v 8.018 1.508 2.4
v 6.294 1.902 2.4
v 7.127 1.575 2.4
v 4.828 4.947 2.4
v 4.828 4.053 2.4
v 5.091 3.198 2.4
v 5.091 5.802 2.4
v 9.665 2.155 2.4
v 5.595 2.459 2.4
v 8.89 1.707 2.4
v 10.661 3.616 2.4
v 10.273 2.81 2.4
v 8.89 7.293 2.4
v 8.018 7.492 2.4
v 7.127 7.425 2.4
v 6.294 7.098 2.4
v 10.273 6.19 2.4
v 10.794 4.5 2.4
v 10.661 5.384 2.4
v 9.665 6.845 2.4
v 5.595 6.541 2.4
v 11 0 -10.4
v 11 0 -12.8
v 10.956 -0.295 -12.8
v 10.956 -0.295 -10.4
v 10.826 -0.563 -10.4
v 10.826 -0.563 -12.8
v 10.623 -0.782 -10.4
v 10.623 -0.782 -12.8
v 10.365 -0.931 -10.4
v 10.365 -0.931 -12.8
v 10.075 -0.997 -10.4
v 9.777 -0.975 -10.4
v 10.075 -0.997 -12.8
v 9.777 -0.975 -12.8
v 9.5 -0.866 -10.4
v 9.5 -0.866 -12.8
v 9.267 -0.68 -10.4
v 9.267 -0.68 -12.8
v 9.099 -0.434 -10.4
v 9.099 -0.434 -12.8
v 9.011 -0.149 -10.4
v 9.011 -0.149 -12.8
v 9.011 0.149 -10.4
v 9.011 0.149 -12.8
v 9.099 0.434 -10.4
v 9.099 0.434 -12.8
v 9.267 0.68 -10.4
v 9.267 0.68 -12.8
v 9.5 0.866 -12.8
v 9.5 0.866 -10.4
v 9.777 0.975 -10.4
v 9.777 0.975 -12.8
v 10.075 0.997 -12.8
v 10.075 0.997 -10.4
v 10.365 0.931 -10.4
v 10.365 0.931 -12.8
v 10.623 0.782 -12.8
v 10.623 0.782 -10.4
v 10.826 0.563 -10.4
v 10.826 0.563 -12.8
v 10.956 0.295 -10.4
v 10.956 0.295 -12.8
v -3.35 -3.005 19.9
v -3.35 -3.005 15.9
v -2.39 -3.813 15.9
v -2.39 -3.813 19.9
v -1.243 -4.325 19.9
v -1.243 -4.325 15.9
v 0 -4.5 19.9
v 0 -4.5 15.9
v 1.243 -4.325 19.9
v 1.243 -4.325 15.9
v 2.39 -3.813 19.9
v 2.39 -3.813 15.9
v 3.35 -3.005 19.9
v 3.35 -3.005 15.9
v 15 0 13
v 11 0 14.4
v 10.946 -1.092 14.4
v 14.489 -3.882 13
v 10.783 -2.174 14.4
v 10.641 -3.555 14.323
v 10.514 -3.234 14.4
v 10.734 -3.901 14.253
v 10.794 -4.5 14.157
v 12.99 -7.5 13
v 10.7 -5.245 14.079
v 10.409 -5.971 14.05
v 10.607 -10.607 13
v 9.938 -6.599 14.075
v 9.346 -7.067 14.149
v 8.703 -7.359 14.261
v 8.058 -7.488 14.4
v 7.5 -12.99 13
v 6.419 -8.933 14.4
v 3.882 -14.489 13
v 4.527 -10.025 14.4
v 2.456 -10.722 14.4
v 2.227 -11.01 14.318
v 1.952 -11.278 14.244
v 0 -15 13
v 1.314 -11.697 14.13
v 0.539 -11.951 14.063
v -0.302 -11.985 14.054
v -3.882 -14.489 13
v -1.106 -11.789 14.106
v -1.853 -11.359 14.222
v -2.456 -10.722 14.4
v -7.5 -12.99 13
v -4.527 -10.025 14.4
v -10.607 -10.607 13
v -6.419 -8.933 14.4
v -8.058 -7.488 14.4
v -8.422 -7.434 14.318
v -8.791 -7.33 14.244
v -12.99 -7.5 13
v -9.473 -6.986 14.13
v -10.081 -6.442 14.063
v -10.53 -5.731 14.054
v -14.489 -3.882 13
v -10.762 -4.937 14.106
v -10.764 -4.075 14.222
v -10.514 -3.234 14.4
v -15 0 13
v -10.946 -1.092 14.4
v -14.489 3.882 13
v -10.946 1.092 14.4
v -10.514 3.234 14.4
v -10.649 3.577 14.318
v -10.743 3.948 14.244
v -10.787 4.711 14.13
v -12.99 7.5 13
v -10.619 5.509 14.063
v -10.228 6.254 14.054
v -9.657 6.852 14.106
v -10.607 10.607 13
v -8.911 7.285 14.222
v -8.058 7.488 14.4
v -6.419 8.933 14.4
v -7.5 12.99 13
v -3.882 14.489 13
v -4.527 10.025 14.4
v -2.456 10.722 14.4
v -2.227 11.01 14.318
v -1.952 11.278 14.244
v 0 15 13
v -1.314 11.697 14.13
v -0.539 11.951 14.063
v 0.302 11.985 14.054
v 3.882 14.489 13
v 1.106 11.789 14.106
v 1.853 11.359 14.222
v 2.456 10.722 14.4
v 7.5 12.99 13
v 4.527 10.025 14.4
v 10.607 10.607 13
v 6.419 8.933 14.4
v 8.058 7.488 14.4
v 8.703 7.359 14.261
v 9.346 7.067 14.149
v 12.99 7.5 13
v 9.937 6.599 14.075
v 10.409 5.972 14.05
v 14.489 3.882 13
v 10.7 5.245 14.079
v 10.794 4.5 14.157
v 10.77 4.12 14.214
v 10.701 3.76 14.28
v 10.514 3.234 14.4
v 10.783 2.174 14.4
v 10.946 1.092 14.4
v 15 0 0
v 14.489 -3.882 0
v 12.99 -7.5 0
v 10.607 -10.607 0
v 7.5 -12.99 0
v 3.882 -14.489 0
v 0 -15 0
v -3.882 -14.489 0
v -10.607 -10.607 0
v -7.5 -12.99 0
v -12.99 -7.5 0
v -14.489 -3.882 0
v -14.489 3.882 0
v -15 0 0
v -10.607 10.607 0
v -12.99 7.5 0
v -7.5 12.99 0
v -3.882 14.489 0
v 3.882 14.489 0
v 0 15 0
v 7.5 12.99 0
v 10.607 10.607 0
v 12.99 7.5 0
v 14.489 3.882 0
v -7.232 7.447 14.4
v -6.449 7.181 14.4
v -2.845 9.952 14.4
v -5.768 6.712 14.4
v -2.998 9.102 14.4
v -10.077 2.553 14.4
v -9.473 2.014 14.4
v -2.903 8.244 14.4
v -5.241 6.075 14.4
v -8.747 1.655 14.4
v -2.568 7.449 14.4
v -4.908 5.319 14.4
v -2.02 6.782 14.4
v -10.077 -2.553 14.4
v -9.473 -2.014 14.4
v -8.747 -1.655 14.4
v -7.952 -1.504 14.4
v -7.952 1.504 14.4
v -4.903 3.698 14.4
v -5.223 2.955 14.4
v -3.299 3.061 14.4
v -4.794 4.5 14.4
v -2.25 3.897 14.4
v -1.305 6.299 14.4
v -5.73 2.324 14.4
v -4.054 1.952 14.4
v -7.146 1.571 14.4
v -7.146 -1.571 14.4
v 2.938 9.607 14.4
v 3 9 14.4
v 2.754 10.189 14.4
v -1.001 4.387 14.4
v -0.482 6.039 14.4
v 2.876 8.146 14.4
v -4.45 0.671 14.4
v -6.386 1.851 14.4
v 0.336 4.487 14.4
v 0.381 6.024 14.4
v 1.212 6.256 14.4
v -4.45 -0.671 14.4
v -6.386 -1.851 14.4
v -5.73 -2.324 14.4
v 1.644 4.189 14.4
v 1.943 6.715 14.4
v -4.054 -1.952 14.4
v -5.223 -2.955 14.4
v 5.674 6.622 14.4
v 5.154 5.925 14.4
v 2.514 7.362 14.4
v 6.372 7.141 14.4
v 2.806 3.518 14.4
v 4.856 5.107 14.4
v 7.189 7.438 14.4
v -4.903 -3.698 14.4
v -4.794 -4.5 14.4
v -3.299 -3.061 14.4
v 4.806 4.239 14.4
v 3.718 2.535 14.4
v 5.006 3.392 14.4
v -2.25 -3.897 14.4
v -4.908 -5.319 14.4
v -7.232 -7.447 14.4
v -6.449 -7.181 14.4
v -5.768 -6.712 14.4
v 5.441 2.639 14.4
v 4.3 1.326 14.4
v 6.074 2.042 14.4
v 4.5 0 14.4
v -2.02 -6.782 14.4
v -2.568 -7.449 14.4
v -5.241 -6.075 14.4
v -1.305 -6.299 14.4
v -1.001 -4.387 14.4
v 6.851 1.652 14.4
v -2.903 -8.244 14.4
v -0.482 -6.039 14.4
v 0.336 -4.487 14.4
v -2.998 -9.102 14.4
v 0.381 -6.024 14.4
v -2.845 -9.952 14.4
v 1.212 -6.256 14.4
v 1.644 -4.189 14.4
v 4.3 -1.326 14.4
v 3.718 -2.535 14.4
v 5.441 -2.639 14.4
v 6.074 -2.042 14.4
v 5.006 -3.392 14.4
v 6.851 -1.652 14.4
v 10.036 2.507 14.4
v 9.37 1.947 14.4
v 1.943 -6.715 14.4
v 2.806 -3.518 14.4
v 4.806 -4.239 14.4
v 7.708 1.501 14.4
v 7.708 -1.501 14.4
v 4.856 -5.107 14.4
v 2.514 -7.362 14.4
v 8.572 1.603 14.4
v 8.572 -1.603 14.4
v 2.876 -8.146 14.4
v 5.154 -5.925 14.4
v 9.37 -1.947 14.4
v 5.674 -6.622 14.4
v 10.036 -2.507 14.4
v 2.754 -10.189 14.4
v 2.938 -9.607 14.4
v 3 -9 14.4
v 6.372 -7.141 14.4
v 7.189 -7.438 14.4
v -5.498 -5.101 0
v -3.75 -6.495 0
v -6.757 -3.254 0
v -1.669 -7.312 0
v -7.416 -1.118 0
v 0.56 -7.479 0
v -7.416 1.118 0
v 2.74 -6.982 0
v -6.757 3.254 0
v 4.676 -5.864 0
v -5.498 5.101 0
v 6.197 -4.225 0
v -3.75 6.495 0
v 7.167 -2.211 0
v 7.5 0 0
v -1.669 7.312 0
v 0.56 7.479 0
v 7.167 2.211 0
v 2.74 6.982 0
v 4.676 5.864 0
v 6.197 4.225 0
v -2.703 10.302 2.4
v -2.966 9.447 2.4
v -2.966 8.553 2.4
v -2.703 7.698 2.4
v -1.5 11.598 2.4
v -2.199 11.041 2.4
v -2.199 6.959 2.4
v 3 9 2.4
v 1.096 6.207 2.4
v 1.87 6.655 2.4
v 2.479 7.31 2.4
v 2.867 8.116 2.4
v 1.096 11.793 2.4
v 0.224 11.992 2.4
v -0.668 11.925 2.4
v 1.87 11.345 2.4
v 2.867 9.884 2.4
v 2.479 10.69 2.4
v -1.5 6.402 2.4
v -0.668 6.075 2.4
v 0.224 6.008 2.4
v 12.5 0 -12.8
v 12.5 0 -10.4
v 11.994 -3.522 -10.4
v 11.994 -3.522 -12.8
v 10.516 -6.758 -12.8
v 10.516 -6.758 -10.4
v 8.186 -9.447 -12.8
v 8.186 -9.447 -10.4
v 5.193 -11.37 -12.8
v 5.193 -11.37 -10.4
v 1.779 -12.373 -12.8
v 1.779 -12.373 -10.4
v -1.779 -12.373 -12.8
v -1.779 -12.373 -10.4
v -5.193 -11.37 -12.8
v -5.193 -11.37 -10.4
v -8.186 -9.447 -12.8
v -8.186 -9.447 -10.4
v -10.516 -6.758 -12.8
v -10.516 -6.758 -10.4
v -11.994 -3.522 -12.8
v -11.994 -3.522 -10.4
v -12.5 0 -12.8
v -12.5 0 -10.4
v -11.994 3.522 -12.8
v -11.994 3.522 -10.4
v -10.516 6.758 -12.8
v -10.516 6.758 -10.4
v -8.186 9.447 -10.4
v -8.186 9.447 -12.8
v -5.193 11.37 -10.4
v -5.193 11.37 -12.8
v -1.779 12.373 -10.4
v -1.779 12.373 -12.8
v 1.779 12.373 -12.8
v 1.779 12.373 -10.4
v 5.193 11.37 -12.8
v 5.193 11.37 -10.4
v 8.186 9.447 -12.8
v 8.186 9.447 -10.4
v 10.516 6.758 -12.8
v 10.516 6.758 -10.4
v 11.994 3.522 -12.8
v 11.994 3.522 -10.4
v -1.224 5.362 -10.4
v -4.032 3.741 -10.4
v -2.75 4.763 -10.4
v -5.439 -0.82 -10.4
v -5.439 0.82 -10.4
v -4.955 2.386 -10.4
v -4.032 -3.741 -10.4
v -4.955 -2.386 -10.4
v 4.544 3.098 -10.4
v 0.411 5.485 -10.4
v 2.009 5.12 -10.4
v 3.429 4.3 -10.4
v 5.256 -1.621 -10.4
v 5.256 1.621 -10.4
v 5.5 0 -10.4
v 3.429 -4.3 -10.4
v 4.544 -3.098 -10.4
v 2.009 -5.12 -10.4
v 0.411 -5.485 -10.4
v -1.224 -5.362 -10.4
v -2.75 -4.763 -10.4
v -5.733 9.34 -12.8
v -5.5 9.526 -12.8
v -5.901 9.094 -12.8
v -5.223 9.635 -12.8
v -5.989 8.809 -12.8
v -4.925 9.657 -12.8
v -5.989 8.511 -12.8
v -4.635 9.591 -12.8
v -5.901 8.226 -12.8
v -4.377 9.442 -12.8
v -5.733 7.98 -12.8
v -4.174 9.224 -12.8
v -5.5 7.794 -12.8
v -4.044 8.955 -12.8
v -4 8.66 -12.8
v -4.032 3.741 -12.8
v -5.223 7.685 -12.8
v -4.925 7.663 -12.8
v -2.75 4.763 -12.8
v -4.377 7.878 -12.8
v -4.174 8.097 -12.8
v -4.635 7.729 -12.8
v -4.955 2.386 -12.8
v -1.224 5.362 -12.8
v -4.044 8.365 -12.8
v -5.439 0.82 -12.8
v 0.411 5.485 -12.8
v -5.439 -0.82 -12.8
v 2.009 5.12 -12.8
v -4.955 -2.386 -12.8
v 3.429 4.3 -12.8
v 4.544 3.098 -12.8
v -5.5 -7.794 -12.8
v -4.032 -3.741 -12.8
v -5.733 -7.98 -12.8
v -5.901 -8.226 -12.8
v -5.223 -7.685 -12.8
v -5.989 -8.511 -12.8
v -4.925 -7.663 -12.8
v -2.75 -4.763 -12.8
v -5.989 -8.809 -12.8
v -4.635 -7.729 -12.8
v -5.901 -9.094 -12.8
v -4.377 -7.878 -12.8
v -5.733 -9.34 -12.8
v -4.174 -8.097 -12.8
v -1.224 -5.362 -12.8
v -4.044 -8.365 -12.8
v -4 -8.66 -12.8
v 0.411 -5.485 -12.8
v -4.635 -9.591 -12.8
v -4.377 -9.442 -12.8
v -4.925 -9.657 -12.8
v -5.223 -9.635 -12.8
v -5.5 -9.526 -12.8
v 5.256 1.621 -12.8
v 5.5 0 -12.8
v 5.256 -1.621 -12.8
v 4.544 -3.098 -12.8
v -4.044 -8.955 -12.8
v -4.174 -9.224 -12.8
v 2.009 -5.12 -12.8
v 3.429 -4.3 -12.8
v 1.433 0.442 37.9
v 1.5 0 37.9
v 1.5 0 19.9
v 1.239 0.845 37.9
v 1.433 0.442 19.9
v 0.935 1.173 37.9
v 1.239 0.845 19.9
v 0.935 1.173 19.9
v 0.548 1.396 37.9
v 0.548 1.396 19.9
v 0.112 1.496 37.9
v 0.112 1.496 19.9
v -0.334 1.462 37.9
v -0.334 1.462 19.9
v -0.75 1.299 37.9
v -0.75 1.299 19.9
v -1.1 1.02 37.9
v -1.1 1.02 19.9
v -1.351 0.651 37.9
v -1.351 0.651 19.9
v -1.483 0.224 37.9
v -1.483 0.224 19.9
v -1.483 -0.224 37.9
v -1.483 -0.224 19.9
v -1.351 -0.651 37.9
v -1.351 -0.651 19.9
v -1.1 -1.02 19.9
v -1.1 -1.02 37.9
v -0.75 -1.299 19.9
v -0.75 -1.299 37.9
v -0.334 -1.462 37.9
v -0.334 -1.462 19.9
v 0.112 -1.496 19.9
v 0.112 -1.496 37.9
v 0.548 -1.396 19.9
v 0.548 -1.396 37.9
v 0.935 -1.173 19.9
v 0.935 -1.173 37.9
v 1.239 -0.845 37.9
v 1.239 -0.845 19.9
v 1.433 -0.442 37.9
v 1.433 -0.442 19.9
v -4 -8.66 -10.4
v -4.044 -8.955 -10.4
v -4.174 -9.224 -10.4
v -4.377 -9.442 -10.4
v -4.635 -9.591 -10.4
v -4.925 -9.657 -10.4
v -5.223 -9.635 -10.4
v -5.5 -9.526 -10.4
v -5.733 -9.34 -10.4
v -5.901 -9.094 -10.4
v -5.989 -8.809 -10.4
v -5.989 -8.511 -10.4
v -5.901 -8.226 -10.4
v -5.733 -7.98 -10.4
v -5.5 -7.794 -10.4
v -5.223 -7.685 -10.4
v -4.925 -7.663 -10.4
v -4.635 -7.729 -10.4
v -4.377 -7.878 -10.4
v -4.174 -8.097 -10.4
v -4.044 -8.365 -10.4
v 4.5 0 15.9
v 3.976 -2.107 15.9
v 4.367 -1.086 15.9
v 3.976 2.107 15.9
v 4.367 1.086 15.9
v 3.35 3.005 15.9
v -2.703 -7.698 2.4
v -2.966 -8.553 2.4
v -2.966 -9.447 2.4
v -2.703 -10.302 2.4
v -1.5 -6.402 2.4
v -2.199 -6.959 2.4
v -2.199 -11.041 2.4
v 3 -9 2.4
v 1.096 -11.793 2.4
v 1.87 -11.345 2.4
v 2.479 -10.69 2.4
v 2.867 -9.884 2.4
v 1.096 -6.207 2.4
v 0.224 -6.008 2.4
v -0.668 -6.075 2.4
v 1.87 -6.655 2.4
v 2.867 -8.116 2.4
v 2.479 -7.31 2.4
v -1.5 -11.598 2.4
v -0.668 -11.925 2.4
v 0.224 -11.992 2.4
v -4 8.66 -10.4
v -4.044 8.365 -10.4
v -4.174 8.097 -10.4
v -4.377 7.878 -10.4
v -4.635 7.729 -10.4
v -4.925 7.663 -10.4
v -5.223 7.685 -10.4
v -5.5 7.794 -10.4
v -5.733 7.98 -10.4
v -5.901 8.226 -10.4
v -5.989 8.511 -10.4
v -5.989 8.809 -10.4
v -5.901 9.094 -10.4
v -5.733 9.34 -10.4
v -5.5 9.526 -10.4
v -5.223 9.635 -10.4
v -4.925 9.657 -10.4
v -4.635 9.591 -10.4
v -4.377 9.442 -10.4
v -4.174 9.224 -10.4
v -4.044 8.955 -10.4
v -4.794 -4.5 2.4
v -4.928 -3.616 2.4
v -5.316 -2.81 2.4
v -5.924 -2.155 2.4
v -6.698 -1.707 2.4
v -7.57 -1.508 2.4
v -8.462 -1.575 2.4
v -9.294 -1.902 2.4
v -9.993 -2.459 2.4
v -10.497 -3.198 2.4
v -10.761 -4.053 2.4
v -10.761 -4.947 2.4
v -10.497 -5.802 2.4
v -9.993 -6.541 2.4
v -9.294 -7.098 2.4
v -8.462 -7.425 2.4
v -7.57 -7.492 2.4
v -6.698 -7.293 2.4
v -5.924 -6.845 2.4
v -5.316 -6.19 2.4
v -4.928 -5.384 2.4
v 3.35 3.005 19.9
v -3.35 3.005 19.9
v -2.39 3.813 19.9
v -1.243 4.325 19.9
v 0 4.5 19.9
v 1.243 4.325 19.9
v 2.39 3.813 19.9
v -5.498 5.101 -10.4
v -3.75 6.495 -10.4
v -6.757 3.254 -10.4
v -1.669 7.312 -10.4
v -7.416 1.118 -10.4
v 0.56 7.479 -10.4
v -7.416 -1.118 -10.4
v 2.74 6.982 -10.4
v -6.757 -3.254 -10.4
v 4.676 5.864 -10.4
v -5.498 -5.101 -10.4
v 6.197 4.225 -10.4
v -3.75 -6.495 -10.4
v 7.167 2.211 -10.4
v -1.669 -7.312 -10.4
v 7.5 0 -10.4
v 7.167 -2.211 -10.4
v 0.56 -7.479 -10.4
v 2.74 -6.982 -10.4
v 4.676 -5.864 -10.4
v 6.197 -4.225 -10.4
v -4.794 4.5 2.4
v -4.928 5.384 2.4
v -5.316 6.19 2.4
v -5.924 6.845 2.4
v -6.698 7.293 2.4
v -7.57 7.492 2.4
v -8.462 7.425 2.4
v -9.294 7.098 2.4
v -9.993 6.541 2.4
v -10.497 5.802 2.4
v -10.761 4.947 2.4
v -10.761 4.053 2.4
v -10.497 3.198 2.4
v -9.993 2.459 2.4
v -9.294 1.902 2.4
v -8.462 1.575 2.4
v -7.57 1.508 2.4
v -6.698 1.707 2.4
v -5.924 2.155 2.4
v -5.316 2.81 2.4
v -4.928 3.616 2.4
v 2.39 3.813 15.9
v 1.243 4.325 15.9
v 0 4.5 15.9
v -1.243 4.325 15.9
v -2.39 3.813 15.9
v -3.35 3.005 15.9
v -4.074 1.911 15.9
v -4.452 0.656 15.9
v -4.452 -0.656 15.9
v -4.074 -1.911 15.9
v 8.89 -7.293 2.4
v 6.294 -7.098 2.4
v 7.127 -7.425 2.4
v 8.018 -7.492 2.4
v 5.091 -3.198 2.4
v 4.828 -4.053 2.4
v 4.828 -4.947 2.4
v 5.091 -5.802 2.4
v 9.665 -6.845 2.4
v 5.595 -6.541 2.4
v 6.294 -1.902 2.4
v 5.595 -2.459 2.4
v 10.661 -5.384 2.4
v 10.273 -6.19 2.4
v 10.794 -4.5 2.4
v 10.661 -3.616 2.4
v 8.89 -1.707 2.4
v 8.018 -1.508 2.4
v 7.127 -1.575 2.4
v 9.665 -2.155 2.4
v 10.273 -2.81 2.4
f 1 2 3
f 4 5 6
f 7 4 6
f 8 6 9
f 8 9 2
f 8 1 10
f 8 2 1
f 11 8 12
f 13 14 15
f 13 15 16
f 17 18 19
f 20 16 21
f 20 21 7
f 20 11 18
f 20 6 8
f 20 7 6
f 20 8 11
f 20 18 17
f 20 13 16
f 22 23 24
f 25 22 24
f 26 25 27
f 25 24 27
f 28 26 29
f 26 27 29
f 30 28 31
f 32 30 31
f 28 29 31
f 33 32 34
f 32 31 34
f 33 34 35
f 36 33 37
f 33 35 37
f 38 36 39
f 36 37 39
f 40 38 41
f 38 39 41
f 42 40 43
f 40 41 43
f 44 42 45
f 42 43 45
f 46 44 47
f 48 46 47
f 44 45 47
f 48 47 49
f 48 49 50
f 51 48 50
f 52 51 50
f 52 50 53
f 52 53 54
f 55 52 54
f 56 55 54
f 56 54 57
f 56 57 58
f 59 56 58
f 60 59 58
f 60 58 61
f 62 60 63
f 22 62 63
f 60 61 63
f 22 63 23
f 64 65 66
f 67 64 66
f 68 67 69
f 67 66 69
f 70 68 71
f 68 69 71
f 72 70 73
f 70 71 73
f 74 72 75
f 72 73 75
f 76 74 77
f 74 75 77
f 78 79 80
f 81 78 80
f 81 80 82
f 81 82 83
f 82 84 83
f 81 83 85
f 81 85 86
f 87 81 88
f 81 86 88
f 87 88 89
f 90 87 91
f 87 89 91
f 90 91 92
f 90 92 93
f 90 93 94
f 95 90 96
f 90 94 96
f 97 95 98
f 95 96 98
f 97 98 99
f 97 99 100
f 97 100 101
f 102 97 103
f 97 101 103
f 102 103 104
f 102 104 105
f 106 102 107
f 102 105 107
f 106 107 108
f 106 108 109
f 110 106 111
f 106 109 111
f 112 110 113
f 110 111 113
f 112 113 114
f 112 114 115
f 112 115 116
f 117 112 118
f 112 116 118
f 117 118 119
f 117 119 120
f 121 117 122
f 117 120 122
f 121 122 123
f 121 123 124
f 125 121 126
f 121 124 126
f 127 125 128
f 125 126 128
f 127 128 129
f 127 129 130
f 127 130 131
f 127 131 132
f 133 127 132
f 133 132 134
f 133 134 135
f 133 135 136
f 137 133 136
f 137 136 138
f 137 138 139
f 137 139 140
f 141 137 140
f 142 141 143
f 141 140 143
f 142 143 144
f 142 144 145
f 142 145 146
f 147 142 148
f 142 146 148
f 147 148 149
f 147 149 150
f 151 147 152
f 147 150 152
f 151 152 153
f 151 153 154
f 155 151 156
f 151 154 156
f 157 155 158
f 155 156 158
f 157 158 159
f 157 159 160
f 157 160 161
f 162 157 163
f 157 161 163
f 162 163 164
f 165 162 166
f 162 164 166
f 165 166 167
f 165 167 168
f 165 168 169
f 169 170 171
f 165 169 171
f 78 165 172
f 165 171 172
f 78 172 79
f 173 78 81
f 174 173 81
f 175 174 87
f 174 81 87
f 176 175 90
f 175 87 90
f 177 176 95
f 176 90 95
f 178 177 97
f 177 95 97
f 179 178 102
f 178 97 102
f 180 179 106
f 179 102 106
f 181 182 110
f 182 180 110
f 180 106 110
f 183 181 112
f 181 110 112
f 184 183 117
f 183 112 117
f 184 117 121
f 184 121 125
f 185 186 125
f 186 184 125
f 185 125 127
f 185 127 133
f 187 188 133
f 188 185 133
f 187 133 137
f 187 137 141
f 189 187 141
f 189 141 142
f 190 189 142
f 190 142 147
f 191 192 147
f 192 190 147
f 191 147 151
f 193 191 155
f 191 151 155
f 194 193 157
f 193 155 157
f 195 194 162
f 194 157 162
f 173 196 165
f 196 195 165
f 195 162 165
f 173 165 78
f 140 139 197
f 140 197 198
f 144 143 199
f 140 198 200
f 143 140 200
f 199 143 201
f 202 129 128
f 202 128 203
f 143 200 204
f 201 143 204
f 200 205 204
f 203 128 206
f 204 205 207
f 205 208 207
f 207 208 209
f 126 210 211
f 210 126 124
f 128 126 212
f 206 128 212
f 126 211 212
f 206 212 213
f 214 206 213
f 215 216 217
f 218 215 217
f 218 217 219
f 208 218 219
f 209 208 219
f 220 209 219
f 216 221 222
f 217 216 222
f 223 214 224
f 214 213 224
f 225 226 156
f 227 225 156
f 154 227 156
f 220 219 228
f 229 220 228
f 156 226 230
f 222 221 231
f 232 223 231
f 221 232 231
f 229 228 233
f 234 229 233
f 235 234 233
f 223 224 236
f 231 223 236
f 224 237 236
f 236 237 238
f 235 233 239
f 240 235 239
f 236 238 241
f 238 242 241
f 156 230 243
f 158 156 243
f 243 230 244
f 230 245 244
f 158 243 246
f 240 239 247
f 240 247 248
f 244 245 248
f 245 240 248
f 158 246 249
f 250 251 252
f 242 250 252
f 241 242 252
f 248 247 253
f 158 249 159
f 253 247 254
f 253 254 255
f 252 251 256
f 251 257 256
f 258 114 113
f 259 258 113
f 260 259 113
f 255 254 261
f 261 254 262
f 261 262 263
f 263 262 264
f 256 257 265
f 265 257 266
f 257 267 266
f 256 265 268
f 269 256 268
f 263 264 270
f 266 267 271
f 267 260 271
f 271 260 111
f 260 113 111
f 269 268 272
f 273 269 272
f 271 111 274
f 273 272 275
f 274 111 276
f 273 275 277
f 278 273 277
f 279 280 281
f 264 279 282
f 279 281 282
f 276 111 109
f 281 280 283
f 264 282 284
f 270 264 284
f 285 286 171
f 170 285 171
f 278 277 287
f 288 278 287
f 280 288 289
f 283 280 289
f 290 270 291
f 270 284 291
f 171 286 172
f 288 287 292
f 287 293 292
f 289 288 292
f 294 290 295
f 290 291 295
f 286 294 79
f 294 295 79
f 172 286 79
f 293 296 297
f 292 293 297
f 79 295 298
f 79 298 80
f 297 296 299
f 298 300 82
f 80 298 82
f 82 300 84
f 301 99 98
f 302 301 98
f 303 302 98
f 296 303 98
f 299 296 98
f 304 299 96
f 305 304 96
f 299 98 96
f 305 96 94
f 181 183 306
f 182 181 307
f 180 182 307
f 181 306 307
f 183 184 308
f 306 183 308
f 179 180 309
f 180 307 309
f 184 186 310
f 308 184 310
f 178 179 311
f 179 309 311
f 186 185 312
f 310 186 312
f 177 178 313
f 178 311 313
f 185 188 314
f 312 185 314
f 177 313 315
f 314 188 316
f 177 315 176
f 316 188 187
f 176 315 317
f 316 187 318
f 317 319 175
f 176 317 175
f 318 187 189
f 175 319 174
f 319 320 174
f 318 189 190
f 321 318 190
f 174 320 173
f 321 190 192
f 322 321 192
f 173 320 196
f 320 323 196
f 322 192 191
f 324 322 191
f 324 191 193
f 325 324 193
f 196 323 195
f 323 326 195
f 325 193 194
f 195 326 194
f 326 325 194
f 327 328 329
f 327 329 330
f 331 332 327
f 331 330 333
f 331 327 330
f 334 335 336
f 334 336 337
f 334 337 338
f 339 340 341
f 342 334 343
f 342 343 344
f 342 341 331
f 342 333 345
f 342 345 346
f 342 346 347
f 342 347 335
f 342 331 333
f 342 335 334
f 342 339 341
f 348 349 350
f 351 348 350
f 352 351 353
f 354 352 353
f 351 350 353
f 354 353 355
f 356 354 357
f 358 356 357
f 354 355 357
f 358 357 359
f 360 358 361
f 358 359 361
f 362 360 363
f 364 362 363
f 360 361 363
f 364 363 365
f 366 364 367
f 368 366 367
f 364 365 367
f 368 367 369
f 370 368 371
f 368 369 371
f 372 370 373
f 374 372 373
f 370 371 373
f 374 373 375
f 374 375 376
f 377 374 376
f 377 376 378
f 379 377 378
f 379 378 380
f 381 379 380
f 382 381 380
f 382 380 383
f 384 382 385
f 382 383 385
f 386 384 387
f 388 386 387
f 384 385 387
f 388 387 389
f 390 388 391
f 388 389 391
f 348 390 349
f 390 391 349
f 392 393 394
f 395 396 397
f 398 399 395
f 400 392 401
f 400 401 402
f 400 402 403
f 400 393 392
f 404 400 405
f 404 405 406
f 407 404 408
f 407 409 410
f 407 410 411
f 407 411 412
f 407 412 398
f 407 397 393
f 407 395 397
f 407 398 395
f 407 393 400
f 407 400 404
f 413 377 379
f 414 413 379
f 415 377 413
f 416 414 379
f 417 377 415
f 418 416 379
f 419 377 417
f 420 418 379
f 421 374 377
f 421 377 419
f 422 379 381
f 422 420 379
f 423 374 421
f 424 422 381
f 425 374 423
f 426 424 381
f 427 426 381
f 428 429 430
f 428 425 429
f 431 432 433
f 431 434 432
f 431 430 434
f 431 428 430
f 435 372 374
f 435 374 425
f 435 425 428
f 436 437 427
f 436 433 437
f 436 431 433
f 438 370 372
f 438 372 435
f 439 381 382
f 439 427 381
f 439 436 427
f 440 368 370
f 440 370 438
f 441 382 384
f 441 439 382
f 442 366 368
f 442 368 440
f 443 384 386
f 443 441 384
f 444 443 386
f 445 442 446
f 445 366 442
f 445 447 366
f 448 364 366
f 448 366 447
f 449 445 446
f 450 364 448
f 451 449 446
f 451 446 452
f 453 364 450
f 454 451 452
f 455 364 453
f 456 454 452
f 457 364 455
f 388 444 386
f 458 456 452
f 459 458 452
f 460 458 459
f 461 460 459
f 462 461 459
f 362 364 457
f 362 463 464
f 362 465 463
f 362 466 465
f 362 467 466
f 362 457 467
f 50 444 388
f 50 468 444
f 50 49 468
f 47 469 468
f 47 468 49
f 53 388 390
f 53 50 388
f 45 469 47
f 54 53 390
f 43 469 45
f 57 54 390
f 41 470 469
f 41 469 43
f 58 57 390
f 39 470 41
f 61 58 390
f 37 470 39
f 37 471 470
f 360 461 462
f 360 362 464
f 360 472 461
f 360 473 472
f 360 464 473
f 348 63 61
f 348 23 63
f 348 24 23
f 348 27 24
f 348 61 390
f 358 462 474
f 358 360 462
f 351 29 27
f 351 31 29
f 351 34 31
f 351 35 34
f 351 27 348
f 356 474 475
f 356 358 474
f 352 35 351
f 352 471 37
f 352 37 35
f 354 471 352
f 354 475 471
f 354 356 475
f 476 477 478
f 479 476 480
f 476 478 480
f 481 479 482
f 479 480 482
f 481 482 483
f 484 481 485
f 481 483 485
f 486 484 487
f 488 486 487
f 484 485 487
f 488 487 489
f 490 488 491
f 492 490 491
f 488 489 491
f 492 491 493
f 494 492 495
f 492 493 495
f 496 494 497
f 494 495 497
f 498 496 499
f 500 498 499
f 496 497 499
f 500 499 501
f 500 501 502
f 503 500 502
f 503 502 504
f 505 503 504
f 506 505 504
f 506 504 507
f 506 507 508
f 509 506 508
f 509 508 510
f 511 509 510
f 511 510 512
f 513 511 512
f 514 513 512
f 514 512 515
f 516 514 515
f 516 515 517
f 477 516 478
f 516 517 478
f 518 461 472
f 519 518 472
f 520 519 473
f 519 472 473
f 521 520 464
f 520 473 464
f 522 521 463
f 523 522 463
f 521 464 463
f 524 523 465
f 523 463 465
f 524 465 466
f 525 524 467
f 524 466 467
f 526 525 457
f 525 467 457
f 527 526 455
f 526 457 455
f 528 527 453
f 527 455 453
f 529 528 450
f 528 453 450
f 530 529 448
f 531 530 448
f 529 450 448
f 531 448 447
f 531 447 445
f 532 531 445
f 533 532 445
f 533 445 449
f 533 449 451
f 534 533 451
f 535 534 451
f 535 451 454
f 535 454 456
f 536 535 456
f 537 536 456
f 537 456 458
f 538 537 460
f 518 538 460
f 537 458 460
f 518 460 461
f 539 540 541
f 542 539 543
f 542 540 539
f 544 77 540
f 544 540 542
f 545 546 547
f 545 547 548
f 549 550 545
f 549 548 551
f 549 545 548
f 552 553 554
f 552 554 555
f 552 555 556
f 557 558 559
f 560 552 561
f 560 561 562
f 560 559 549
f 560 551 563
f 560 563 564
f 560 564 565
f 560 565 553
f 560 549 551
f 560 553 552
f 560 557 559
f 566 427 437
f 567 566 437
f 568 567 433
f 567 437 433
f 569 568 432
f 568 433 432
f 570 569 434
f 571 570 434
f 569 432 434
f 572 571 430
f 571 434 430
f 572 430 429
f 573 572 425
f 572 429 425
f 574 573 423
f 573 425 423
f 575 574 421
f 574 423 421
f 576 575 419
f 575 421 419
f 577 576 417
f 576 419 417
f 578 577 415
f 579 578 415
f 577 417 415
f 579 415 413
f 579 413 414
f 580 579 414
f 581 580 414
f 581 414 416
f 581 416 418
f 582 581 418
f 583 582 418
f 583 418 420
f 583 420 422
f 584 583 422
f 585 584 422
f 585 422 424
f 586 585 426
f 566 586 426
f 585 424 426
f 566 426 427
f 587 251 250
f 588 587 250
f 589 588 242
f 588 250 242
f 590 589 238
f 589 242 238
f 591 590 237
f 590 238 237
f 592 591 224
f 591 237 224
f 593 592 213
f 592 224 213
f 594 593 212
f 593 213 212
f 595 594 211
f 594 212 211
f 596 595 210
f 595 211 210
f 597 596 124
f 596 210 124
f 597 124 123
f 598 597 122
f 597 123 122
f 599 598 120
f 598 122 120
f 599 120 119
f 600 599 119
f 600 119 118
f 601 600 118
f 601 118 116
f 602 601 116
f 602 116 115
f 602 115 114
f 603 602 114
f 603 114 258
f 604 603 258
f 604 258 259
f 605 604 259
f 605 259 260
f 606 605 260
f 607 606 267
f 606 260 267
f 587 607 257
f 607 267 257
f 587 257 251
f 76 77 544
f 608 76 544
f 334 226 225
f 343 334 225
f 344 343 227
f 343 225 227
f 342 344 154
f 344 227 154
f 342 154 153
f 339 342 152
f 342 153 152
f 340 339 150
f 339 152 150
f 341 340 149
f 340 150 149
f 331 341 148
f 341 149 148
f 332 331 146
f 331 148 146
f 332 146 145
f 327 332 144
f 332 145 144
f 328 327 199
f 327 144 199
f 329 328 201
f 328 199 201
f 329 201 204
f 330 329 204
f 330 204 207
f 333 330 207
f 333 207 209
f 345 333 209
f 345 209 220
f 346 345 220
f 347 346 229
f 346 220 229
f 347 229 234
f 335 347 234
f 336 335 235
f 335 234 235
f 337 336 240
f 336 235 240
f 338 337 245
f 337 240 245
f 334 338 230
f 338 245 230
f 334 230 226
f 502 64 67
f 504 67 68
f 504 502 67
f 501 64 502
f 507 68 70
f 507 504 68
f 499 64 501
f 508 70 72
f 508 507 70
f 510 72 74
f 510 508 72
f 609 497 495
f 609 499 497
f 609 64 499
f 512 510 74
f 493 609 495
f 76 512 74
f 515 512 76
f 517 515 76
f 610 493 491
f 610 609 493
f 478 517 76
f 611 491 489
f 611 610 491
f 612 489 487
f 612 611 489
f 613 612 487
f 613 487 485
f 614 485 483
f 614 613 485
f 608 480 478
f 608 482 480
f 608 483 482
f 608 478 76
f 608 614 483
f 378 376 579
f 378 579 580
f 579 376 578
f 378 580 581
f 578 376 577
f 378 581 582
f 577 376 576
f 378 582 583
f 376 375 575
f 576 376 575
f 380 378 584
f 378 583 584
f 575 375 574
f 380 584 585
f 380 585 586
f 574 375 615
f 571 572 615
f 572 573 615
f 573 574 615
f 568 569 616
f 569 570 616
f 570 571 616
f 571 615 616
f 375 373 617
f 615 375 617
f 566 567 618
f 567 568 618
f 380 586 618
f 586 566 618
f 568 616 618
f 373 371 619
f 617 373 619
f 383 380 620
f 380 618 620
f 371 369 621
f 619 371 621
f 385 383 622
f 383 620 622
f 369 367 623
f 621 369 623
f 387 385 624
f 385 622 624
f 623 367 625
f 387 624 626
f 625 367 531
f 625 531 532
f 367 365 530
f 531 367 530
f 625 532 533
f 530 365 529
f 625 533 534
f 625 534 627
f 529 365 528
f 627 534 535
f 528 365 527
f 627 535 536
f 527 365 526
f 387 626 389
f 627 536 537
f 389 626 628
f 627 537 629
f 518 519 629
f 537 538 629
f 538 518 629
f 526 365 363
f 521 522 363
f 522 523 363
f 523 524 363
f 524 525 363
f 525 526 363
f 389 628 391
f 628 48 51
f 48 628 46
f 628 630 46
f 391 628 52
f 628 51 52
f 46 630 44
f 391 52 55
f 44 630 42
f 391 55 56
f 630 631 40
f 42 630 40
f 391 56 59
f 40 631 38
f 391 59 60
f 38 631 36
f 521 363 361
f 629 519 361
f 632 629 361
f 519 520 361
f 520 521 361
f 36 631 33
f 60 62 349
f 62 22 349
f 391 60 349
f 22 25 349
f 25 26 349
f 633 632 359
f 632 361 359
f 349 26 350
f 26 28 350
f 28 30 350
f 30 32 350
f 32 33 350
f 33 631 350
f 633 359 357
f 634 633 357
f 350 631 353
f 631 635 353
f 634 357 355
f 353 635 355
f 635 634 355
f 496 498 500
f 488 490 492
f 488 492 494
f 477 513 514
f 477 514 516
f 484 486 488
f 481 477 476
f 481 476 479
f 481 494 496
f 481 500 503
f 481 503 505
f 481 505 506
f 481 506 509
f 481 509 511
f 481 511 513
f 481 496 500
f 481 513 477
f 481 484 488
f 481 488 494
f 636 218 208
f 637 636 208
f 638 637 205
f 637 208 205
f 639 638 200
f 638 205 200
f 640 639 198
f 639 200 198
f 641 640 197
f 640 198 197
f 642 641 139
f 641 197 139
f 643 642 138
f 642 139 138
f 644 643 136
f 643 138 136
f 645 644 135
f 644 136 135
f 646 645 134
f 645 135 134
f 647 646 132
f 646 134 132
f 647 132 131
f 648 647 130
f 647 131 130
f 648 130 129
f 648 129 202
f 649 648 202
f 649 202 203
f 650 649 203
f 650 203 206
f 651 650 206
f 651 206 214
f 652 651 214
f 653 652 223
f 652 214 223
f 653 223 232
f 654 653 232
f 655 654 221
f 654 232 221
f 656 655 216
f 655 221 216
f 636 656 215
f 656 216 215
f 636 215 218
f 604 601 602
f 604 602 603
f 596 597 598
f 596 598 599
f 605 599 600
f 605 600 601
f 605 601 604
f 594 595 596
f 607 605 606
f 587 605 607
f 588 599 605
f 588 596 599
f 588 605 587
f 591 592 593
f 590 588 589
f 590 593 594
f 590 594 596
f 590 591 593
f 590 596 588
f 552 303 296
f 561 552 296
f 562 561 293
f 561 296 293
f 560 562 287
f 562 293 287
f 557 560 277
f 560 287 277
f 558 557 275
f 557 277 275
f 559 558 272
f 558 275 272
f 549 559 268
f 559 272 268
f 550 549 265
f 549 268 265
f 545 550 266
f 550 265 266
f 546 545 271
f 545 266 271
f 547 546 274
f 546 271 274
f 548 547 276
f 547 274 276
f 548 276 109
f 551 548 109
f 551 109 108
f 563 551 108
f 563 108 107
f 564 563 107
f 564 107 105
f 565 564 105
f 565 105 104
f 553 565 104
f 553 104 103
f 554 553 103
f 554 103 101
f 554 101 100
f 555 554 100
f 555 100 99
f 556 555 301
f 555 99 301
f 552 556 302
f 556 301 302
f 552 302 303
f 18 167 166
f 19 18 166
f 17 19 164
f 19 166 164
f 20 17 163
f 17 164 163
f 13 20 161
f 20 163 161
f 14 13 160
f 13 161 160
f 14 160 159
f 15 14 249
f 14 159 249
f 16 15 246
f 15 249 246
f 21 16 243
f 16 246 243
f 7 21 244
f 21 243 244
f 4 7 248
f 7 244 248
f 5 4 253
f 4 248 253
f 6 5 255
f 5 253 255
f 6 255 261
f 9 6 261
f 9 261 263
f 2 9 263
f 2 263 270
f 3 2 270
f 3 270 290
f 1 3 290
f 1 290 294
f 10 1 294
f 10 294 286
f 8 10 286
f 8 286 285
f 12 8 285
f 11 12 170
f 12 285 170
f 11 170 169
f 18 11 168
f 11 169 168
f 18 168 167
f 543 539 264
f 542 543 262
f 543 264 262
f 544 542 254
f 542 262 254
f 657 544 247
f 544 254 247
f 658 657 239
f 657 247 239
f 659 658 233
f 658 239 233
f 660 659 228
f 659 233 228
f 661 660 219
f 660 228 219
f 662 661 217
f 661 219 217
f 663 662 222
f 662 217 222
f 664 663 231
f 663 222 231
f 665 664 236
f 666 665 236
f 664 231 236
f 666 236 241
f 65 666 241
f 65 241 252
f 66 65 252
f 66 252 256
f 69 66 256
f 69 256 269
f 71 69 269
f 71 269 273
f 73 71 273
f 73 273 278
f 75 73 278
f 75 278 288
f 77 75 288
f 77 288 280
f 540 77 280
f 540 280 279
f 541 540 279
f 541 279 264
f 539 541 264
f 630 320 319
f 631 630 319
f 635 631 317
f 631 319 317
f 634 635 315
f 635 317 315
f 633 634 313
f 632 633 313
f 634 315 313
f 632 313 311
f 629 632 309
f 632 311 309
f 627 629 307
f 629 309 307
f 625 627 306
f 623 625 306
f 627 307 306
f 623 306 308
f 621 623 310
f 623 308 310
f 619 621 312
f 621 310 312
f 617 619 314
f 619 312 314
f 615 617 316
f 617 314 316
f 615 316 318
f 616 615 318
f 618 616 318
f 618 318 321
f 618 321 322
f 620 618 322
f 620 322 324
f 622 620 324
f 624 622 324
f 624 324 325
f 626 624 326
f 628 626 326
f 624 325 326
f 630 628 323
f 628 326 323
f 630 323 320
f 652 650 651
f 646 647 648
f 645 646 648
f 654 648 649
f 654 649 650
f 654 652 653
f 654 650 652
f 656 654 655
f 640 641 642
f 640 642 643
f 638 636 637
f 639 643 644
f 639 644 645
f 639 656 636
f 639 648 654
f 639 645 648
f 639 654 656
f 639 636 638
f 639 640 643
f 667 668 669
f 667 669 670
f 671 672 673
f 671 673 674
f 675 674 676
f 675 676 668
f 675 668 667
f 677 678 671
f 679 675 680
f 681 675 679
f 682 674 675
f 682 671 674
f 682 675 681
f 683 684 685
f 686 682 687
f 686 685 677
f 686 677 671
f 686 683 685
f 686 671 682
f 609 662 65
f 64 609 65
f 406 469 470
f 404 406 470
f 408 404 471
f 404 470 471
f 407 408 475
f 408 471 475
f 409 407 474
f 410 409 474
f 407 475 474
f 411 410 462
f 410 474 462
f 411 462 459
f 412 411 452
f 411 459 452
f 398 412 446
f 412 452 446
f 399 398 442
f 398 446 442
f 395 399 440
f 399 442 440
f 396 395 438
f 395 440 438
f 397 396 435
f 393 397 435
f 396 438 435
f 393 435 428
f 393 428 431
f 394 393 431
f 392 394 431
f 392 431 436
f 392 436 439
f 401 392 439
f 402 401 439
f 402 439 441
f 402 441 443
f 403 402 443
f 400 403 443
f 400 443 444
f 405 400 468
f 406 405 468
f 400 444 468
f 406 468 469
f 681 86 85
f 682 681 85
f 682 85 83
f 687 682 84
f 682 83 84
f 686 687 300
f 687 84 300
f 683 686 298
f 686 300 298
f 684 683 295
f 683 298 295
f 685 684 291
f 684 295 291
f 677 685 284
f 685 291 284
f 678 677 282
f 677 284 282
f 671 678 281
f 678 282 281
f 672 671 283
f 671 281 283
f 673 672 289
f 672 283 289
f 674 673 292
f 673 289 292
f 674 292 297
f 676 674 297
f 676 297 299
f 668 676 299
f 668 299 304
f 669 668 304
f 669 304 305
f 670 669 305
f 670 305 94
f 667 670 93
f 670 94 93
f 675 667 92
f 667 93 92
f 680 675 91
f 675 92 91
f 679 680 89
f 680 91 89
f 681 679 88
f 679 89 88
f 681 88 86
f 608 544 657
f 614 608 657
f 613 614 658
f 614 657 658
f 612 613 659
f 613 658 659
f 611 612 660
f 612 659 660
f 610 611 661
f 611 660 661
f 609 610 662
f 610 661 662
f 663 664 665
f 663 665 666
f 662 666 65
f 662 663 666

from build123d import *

# Parameters (mm, degrees)
F0_R      = 15
F1_DEPTH  = 12
F4_R      = 3
F5_DEPTH  = 12
F6_R      = 4.5
F7_DEPTH  = 1.5
F9_DEPTH  = 4
F10_R     = 1.5
F11_DEPTH = 18
F12_R     = 7.5
F13_DEPTH = 10.4
F14_R     = 12.5
F15_DEPTH = 2.4
F16_R     = 5.5
F16_R_2   = 1
F17_DEPTH = 2.4


with BuildPart() as f1:
    # F0 (on Top) → F1 (new body)
    with BuildSketch(Plane.XY):
        Circle(F0_R)
    extrude(amount=F1_DEPTH)

    # F2 (on Front) → F3 (revolve)
    with BuildSketch(Plane.XZ):
        Polygon((11, 14.4), (0, 14.4), (0, 12), (15, 12), (15, 13), align=None)
    revolve(axis=Axis((0, 0, 13.2), (0, 0, -1)))

    # F4 (on face) → F5 (cut)
    with BuildSketch(Plane.XY.offset(14.4)):
        with Locations((0, 9)):
            Circle(F4_R)
        with Locations((-7.794229, 4.5)):
            Circle(F4_R)
        with Locations((-7.794229, -4.5)):
            Circle(F4_R)
        with Locations((0, -9)):
            Circle(F4_R)
        with Locations((7.794229, -4.5)):
            Circle(F4_R)
        with Locations((7.794229, 4.5)):
            Circle(F4_R)
    extrude(amount=-F5_DEPTH, mode=Mode.SUBTRACT)

    # F6 (on face) → F7 (join)
    with BuildSketch(Plane.XY.offset(14.4)):
        Circle(F6_R)
    extrude(amount=F7_DEPTH)

    # F8 (on face) → F9 (join)
    with BuildSketch(Plane.XY.offset(15.9)):
        with BuildLine():
            Line((3.35, -3.00458), (3.35, 3.00458))
            ThreePointArc((3.35, 3.00458), (0, 4.5), (-3.35, 3.00458))
            Line((-3.35, 3.00458), (-3.35, -3.00458))
            ThreePointArc((-3.35, -3.00458), (0, -4.5), (3.35, -3.00458))
        make_face()
    extrude(amount=F9_DEPTH)

    # F10 (on face) → F11 (join)
    with BuildSketch(Plane.XY.offset(19.9)):
        Circle(F10_R)
    extrude(amount=F11_DEPTH)

    # F12 (on face) → F13 (join)
    with BuildSketch(Plane(origin=(0, 0, 0), x_dir=(1, 0, 0), z_dir=(0, 0, -1))):
        Circle(F12_R)
    extrude(amount=F13_DEPTH)

    # F14 (on face) → F15 (join)
    with BuildSketch(Plane(origin=(0, 0, -10.4), x_dir=(1, 0, 0), z_dir=(0, 0, -1))):
        Circle(F14_R)
    extrude(amount=F15_DEPTH)

    # F16 (on face) → F17 (cut)
    with BuildSketch(Plane(origin=(0, 0, -12.8), x_dir=(1, 0, 0), z_dir=(0, 0, -1))):
        Circle(F16_R)
        with Locations((10, 0)):
            Circle(F16_R_2)
        with Locations((-5, 8.660254)):
            Circle(F16_R_2)
        with Locations((-5, -8.660254)):
            Circle(F16_R_2)
    extrude(amount=-F17_DEPTH, mode=Mode.SUBTRACT)


solid = f1.part
